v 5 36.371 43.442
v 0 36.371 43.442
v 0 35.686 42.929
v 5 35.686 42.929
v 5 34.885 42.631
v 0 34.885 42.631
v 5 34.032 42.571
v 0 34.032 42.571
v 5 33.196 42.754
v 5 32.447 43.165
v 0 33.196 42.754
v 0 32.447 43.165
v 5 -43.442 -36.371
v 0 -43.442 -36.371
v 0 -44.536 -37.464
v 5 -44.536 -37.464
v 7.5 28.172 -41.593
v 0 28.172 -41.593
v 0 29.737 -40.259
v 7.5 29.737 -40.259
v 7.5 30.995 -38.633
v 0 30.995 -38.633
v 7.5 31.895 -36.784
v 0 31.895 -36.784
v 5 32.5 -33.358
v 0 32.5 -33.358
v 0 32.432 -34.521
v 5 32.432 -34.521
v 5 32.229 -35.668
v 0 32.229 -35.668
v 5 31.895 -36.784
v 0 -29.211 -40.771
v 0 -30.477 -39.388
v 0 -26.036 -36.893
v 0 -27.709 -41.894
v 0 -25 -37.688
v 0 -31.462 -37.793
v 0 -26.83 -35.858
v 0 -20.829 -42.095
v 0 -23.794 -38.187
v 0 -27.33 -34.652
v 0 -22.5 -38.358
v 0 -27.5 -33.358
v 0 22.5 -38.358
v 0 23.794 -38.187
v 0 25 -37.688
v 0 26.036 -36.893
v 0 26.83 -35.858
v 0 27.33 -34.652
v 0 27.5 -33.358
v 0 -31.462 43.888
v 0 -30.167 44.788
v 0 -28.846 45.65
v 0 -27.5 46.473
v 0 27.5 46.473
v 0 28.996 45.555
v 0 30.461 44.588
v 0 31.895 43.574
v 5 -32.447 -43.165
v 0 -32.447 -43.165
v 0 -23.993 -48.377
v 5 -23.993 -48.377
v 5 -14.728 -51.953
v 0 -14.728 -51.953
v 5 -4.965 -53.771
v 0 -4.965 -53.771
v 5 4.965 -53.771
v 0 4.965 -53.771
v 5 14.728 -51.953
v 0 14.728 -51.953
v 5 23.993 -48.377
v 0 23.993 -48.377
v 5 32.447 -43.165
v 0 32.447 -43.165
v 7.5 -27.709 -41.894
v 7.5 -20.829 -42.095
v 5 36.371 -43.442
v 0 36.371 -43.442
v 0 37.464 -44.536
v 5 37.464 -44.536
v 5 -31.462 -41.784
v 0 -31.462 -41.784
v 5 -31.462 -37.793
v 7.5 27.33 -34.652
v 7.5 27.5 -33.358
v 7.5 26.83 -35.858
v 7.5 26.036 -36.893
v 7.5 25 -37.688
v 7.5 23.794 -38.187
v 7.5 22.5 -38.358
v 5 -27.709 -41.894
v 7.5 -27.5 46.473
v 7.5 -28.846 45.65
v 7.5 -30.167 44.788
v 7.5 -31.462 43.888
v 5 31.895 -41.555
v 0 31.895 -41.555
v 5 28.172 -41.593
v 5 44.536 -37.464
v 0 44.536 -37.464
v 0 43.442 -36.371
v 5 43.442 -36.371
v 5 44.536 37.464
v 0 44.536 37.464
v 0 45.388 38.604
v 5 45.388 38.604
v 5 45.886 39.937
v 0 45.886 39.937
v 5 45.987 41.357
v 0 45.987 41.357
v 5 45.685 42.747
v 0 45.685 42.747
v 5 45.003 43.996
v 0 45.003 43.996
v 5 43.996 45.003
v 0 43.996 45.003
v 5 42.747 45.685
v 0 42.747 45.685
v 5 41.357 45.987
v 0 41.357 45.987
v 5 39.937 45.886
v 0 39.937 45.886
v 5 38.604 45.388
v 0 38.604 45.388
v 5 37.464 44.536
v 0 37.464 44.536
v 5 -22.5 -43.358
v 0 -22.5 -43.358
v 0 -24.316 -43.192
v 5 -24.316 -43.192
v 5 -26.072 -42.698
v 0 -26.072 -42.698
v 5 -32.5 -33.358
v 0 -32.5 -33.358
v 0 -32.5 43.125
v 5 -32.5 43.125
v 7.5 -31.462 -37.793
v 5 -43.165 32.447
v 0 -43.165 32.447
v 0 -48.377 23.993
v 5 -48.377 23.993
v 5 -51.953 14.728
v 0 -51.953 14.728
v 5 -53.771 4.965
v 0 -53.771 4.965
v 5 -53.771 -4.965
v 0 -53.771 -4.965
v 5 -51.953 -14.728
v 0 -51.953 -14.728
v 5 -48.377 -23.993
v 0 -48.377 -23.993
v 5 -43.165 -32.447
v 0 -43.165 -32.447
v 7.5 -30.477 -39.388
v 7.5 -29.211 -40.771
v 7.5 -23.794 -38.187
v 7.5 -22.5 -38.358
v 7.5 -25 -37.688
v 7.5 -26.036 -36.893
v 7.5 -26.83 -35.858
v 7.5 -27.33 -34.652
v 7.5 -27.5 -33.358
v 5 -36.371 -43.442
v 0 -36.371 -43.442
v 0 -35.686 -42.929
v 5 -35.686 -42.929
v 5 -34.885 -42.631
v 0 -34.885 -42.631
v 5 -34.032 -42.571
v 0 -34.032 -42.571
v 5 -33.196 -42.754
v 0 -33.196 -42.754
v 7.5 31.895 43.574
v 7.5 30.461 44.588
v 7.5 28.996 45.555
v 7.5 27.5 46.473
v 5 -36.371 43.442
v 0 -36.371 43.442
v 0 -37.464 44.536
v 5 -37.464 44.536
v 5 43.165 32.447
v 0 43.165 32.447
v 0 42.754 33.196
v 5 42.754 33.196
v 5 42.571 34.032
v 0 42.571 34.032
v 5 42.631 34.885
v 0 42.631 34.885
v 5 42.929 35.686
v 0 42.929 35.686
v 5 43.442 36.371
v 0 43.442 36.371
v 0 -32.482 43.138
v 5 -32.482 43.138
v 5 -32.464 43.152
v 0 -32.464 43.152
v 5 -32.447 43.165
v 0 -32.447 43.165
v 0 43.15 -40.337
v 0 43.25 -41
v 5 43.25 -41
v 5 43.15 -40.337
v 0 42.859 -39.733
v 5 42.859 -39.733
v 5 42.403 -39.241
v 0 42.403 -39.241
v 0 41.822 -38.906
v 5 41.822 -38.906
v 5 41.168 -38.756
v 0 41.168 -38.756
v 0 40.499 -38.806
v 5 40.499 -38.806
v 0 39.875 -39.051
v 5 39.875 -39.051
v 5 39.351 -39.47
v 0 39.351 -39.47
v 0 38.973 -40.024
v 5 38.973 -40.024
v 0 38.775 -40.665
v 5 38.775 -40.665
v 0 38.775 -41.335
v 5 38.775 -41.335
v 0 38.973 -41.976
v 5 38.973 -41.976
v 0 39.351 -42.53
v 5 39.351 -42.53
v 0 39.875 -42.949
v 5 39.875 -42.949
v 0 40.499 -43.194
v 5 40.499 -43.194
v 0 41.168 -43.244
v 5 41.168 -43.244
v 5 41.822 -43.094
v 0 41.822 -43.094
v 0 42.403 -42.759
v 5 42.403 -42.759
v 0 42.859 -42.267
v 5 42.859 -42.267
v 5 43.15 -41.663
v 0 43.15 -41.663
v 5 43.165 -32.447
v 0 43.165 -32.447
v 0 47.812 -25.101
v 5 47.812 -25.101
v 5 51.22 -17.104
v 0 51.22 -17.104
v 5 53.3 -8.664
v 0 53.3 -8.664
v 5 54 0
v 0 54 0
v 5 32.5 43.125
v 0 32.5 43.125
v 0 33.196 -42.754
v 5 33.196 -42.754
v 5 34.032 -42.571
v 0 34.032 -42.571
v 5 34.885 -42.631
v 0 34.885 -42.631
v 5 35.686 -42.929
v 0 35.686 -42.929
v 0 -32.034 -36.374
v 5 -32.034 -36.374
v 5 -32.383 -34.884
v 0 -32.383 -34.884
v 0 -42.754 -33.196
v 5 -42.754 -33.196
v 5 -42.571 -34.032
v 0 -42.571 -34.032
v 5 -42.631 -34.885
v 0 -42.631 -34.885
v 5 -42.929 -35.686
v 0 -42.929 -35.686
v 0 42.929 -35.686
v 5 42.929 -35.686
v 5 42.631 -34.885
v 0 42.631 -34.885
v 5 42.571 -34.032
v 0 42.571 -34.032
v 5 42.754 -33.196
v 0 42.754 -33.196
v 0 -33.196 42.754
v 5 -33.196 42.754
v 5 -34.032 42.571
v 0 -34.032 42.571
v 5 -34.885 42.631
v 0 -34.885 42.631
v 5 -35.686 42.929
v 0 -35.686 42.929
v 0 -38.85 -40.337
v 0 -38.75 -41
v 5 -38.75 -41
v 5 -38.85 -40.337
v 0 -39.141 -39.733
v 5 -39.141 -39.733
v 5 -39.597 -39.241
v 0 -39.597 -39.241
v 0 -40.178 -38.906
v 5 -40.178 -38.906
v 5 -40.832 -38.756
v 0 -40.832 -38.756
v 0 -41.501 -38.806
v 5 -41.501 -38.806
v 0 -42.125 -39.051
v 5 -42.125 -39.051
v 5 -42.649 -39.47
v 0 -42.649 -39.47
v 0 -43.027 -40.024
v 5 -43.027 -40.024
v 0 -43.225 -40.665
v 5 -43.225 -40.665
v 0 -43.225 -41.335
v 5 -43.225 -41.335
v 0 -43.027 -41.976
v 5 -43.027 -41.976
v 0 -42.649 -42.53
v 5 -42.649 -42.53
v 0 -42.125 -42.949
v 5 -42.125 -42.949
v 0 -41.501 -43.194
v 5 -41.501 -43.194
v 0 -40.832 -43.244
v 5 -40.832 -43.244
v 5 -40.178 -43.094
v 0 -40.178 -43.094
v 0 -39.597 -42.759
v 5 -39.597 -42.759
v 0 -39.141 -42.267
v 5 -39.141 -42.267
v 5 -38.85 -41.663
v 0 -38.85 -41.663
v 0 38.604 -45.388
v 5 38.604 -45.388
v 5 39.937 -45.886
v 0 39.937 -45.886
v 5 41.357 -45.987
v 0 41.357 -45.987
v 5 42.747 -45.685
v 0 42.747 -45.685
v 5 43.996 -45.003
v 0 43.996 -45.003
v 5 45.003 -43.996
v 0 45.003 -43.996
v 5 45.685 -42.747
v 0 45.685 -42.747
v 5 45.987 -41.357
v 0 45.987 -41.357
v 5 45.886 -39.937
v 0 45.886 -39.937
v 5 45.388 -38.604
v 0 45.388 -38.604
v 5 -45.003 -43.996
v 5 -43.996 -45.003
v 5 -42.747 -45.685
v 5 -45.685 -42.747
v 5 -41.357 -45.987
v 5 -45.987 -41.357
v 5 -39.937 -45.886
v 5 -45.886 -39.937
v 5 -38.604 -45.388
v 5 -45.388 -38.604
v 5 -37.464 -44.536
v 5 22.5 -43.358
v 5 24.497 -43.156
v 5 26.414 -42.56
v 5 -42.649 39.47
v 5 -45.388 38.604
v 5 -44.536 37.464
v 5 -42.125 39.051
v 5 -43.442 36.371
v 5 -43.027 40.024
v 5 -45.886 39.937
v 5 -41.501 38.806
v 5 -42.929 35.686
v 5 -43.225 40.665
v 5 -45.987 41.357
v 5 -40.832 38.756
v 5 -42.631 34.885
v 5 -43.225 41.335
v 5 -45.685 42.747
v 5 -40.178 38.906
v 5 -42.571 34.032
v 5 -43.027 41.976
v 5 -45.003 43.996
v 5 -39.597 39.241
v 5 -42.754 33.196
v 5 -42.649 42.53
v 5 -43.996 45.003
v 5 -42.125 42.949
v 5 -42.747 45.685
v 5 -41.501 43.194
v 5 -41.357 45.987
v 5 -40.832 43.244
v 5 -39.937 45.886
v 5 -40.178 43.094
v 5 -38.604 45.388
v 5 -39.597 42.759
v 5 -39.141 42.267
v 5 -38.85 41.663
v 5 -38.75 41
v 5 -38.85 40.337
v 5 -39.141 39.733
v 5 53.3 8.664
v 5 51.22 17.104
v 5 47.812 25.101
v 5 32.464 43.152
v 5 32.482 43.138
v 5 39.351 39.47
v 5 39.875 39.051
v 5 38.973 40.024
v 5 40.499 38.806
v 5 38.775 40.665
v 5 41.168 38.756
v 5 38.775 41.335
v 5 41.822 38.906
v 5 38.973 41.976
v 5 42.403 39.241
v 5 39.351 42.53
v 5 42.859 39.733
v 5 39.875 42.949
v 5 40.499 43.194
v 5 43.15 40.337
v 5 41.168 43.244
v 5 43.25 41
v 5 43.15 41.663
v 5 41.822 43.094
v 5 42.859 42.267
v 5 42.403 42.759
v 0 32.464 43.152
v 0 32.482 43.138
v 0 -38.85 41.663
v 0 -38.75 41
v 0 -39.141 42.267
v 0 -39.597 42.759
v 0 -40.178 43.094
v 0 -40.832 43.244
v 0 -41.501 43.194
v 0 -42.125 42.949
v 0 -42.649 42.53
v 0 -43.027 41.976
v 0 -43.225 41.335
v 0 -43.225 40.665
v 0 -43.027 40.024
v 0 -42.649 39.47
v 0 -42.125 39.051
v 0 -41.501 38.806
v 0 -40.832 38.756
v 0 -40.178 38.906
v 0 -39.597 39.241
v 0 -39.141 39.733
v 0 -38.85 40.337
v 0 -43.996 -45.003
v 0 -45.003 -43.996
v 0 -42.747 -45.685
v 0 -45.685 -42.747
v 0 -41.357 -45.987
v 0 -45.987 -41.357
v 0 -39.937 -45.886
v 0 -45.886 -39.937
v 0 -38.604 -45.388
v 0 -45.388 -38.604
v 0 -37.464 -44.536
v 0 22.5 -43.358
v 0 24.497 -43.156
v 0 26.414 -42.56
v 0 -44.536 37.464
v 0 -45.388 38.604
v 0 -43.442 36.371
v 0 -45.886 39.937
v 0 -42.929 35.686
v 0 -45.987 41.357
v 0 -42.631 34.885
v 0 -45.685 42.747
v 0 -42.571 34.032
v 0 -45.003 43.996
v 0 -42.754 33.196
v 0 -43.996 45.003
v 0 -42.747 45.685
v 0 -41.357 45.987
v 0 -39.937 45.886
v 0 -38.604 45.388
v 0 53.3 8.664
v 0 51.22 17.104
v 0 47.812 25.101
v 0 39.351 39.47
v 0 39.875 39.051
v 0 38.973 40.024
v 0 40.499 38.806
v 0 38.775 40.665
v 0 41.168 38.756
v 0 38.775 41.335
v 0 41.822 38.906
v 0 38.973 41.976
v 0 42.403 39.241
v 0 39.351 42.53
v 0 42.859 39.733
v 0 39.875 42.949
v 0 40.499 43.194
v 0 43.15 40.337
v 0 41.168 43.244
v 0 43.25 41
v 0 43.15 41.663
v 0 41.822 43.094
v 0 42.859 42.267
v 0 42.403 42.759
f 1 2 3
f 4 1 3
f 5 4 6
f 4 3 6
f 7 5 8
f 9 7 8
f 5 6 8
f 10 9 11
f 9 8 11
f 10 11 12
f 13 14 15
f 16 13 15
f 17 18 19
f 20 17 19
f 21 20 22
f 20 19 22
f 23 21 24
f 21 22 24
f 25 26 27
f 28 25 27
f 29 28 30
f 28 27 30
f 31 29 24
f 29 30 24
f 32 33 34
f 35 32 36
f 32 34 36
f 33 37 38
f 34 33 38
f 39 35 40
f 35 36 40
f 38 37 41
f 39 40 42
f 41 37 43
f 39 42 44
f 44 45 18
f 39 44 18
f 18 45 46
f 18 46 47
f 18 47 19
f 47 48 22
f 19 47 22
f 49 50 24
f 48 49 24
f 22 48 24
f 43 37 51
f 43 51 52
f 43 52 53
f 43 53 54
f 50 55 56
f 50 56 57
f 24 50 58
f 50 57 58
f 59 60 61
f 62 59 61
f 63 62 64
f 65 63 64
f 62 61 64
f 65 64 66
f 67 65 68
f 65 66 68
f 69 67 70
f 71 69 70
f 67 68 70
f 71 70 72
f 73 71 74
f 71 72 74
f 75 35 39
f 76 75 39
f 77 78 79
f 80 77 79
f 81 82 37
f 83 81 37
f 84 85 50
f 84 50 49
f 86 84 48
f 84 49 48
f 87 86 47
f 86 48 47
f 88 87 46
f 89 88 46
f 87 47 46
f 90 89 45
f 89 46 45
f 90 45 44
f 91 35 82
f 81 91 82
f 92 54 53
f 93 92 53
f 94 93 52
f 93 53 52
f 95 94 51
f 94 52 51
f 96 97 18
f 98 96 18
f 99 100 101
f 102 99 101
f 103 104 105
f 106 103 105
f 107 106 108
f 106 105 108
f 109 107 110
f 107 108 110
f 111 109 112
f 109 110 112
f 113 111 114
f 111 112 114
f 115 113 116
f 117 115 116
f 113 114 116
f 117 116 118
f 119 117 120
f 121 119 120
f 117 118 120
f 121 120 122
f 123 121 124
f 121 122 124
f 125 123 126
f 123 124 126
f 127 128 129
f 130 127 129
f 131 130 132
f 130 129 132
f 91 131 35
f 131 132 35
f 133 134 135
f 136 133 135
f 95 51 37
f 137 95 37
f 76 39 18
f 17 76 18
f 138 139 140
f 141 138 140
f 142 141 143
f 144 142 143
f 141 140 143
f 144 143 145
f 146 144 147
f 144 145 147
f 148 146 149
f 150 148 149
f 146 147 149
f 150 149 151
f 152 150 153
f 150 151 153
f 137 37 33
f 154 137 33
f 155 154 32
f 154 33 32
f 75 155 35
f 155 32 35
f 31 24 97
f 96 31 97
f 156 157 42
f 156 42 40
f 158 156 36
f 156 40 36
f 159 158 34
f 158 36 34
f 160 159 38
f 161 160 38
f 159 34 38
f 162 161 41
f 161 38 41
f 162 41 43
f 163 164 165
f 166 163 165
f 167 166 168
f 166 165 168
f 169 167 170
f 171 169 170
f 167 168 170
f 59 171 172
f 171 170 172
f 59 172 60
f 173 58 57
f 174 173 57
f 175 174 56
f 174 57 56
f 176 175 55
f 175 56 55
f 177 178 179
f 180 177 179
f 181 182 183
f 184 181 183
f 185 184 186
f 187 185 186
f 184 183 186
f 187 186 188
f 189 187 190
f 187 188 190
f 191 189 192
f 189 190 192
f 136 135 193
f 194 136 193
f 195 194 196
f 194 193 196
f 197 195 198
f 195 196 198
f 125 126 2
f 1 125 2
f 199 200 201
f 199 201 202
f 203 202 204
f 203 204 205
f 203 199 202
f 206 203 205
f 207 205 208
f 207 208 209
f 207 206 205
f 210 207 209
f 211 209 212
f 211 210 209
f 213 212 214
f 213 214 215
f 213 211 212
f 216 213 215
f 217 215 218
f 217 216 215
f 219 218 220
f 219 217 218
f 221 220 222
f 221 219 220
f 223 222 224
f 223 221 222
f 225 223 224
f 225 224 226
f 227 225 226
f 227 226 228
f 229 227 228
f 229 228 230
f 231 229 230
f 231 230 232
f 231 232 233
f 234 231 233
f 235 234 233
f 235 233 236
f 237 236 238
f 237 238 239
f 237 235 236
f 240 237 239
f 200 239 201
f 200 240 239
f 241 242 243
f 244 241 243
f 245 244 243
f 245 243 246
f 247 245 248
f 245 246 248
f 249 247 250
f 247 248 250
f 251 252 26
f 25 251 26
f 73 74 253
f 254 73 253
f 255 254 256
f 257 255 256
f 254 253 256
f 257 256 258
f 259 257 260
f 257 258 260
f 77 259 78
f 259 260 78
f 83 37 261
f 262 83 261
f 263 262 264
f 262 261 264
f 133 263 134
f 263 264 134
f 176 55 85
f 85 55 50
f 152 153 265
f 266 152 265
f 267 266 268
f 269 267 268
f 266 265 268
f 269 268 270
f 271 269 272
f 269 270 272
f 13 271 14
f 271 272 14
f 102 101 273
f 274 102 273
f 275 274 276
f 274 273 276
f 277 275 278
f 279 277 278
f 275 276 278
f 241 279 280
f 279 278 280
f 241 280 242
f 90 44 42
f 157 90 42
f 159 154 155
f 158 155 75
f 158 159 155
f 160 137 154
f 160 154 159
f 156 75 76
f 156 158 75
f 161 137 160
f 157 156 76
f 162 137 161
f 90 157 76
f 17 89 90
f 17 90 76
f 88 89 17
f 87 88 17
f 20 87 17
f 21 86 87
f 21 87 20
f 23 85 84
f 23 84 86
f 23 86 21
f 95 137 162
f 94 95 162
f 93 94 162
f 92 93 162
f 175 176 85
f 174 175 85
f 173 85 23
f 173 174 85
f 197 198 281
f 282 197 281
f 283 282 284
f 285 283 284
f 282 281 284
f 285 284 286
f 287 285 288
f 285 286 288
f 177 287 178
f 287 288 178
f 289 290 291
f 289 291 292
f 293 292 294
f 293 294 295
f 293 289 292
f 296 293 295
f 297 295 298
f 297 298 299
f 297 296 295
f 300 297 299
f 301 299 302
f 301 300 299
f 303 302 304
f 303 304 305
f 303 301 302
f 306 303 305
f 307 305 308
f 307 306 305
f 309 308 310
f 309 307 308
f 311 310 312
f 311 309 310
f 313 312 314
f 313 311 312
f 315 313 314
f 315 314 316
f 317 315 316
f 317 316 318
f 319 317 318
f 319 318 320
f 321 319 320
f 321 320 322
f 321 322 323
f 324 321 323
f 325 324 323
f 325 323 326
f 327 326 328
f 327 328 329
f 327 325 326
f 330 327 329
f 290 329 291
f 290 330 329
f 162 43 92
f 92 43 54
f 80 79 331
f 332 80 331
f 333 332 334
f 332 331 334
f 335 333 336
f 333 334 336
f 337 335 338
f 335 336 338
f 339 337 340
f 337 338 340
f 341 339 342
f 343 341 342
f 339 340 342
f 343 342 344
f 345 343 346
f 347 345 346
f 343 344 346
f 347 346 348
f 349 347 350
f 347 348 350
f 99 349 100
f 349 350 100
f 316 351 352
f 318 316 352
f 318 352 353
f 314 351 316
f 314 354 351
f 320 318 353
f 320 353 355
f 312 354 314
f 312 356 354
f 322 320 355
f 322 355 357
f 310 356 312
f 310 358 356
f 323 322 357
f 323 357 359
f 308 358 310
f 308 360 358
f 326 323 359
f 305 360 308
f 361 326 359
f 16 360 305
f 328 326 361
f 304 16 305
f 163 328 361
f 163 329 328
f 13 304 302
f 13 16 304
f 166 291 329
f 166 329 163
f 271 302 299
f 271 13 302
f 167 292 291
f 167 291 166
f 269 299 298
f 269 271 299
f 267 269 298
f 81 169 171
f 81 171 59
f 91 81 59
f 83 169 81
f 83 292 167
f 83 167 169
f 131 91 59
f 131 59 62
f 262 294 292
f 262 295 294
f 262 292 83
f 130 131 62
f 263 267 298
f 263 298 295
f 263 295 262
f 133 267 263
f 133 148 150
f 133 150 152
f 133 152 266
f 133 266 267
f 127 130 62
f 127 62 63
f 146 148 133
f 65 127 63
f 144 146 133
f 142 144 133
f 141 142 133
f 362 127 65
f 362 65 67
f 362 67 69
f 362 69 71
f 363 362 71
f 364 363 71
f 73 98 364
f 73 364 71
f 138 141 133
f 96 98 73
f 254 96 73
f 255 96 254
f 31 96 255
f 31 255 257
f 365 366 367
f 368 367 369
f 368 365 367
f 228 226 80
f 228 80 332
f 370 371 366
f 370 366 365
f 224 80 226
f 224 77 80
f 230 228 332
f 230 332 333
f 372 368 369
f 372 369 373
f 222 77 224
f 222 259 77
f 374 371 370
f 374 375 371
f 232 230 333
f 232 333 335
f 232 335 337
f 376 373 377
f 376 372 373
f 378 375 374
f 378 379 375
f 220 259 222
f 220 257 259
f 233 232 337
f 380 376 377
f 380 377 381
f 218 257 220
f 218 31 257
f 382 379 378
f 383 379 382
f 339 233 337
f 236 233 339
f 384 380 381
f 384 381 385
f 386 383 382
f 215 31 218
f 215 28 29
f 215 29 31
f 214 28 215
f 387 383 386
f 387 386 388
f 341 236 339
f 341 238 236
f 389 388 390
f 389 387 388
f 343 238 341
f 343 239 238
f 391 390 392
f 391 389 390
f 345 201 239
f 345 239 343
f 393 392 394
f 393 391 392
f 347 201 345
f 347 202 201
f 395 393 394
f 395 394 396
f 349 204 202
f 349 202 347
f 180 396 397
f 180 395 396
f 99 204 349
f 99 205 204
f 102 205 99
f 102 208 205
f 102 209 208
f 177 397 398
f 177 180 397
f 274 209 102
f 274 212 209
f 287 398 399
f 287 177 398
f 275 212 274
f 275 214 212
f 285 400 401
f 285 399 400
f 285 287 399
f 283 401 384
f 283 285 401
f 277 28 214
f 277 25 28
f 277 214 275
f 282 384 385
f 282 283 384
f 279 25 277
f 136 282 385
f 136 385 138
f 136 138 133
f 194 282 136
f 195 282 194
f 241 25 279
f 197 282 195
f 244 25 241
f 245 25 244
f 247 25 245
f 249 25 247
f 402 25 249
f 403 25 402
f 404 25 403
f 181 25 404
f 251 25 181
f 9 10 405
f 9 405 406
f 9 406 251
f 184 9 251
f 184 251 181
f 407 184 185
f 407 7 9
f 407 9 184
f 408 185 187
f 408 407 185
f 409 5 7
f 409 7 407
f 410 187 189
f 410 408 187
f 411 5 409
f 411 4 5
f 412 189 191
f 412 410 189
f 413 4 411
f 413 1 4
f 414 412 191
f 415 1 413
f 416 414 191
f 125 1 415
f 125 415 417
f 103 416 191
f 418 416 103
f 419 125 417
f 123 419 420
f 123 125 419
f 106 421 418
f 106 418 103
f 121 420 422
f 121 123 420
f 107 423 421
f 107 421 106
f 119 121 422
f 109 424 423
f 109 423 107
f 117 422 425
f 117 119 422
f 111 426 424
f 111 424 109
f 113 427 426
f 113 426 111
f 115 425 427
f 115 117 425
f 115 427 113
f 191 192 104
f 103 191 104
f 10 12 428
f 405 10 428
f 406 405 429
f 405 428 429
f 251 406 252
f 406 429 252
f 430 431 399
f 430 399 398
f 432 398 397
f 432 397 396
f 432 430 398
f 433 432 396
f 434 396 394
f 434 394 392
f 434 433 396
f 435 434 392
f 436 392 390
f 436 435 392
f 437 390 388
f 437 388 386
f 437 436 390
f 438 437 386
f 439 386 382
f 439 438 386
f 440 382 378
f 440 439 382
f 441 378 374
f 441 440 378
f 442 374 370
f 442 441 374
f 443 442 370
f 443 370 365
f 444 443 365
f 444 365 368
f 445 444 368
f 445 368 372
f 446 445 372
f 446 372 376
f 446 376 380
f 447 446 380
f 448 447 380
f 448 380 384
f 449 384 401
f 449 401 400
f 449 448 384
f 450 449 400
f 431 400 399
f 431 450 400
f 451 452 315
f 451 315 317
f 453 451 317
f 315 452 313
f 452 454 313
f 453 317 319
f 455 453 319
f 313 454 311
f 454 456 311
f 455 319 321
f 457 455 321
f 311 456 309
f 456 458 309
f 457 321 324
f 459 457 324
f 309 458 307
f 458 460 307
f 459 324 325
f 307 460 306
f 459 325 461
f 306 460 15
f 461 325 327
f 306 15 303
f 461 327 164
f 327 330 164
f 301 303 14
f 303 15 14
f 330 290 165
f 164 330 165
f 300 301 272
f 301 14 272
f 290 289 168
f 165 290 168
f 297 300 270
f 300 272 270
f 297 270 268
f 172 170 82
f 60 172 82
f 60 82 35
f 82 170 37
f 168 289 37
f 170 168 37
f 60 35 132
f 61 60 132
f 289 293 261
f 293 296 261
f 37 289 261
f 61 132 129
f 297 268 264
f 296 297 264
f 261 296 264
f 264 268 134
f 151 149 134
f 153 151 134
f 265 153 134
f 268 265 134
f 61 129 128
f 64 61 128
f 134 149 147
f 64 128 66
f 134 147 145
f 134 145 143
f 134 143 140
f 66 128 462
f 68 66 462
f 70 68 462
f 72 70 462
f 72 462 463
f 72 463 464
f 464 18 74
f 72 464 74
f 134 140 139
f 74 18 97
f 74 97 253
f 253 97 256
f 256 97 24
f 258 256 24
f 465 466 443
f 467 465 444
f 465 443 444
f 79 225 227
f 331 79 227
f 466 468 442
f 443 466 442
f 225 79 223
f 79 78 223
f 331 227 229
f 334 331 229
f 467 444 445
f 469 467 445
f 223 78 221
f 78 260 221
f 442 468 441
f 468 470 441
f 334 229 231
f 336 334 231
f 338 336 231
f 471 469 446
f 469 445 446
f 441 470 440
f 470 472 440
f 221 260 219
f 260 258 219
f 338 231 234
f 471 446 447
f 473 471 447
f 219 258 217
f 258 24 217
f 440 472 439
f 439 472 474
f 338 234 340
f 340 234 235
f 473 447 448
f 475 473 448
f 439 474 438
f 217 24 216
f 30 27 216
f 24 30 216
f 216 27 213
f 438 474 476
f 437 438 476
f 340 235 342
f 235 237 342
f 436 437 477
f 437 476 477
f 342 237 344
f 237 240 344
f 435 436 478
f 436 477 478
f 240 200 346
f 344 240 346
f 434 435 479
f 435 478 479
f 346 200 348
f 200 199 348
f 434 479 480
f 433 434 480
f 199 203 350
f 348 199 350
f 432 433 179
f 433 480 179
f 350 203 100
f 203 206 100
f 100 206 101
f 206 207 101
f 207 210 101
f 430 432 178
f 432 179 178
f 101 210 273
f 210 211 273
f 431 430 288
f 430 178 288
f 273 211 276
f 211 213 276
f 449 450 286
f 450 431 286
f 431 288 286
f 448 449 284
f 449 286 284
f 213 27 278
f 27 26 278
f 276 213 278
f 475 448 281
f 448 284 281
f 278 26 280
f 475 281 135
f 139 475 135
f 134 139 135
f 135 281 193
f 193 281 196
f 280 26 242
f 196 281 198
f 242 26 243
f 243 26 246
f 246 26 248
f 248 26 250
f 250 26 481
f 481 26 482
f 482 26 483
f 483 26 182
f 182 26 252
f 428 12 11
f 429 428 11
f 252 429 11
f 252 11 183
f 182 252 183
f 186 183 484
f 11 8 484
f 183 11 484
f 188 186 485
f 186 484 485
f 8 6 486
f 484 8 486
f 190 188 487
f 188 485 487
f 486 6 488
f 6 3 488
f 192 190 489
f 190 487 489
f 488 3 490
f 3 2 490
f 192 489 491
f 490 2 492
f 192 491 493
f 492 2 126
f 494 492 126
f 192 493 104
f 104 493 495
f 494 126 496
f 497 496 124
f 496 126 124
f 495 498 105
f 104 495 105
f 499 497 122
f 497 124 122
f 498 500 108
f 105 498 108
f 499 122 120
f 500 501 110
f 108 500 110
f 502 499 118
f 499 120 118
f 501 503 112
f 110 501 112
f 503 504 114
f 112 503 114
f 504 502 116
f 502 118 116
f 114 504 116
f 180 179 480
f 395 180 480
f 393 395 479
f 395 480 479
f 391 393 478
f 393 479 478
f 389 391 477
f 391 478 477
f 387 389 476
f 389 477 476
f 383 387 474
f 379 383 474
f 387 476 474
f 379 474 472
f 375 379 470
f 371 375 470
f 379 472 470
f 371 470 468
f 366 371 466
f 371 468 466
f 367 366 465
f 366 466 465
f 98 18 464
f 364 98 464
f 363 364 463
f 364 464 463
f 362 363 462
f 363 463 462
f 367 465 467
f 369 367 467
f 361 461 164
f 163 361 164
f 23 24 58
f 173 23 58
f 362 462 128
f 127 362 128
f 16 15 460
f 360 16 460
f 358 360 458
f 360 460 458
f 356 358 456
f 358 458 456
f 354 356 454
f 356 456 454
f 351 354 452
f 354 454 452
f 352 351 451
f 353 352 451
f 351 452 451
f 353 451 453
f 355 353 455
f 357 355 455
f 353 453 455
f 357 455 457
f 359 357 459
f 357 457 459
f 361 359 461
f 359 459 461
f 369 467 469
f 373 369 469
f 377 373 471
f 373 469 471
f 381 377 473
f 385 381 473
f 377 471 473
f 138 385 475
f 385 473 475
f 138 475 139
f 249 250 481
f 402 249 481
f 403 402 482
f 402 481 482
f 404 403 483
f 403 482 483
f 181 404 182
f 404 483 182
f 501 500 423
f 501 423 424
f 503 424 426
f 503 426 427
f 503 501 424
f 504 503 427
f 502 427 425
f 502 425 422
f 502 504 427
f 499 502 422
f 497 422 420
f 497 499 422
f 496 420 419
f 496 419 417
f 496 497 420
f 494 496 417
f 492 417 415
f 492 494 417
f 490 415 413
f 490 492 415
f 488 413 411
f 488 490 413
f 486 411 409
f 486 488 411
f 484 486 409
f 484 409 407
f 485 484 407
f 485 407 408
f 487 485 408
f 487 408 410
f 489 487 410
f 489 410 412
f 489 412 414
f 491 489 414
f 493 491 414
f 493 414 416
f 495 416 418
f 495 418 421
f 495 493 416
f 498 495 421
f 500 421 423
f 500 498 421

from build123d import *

# Parameters (mm, degrees)
F0_R     = 2.25
F1_DEPTH = 5
F2_DEPTH = 7.5


# Not quite as in the source:
# - a feature of the source that left no trace in its solid (it failed there, or was rolled back) is left out


with BuildPart() as f1:
    # F0 (on Right) → F1 (new body)
    with BuildSketch(Plane.YZ):
        with BuildLine():
            Line((-32.5, -33.3578620553), (-32.5, 43.1248188402))
            ThreePointArc((-32.5, 43.1248188402), (-38.2073481766, 38.1601696185), (-43.1649418054, 32.4466916485))
            ThreePointArc((-43.1649418054, 32.4466916485), (-54, 0), (-43.1649418054, -32.4466916485))
            ThreePointArc((-43.1649418054, -32.4466916485), (-38.1837661841, -38.1837661841), (-32.4466916485, -43.1649418054))
            ThreePointArc((-32.4466916485, -43.1649418054), (0, -54), (32.4466916485, -43.1649418054))
            ThreePointArc((32.4466916485, -43.1649418054), (38.1837661841, -38.1837661841), (43.1649418054, -32.4466916485))
            ThreePointArc((43.1649418054, -32.4466916485), (51.2196586161, -17.1039928453), (54, 0))
            ThreePointArc((54, 0), (51.2196586161, 17.1039928453), (43.1649418054, 32.4466916485))
            ThreePointArc((43.1649418054, 32.4466916485), (38.2073481766, 38.1601696185), (32.5, 43.1248188402))
            Line((32.5, 43.1248188402), (32.5, -33.3578620553))
            ThreePointArc((32.5, -33.3578620553), (32.3474874667, -35.0976869294), (31.8946018815, -36.7844427837))
            Line((31.8946018815, -36.7844427837), (31.8946018815, -41.5552656251))
            Line((31.8946018815, -41.5552656251), (28.1724253923, -41.593369943))
            ThreePointArc((28.1724253923, -41.593369943), (25.4702627091, -42.9065551302), (22.5, -43.3578620553))
            Line((22.5, -43.3578620553), (-22.5, -43.3578620553))
            ThreePointArc((-22.5, -43.3578620553), (-25.2056219122, -42.9848870406), (-27.70941795, -41.8937840689))
            Line((-27.70941795, -41.8937840689), (-31.4624607563, -41.7840279114))
            Line((-31.4624607563, -41.7840279114), (-31.4624607563, -37.7934338552))
            ThreePointArc((-31.4624607563, -37.7934338552), (-32.2371609713, -35.6355135252), (-32.5, -33.3578620553))
        make_face()
        with BuildLine():
            ThreePointArc((-32.5, 43.1248188402), (-32.4733520211, 43.1448885561), (-32.4466916485, 43.1649418054))
            ThreePointArc((-32.4466916485, 43.1649418054), (-34.4603348429, 42.5704269643), (-36.3706059725, 43.4416737844))
            Line((-36.3706059725, 43.4416737844), (-37.4644660941, 44.5355339059))
            ThreePointArc((-37.4644660941, 44.5355339059), (-44.5355339059, 44.5355339059), (-44.5355339059, 37.4644660941))
            Line((-44.5355339059, 37.4644660941), (-43.4416737844, 36.3706059725))
            ThreePointArc((-43.4416737844, 36.3706059725), (-42.5704269643, 34.4603348429), (-43.1649418054, 32.4466916485))
            ThreePointArc((-43.1649418054, 32.4466916485), (-38.2073481766, 38.1601696185), (-32.5, 43.1248188402))
        make_face()
        with Locations((-41, 41)):
            Circle(F0_R, mode=Mode.SUBTRACT)
        with BuildLine():
            ThreePointArc((32.5, 43.1248188402), (38.2073481766, 38.1601696185), (43.1649418054, 32.4466916485))
            ThreePointArc((43.1649418054, 32.4466916485), (42.5704269643, 34.4603348429), (43.4416737844, 36.3706059725))
            Line((43.4416737844, 36.3706059725), (44.5355339059, 37.4644660941))
            ThreePointArc((44.5355339059, 37.4644660941), (44.5355339059, 44.5355339059), (37.4644660941, 44.5355339059))
            Line((37.4644660941, 44.5355339059), (36.3706059725, 43.4416737844))
            ThreePointArc((36.3706059725, 43.4416737844), (34.4603348429, 42.5704269643), (32.4466916485, 43.1649418054))
            ThreePointArc((32.4466916485, 43.1649418054), (32.4733520211, 43.1448885561), (32.5, 43.1248188402))
        make_face()
        with Locations((41, 41)):
            Circle(F0_R, mode=Mode.SUBTRACT)
        with BuildLine():
            ThreePointArc((43.1649418054, -32.4466916485), (38.1837661841, -38.1837661841), (32.4466916485, -43.1649418054))
            ThreePointArc((32.4466916485, -43.1649418054), (34.4603348429, -42.5704269643), (36.3706059725, -43.4416737844))
            Line((36.3706059725, -43.4416737844), (37.4644660941, -44.5355339059))
            ThreePointArc((37.4644660941, -44.5355339059), (44.5355339059, -44.5355339059), (44.5355339059, -37.4644660941))
            Line((44.5355339059, -37.4644660941), (43.4416737844, -36.3706059725))
            ThreePointArc((43.4416737844, -36.3706059725), (42.5704269643, -34.4603348429), (43.1649418054, -32.4466916485))
        make_face()
        with Locations((41, -41)):
            Circle(F0_R, mode=Mode.SUBTRACT)
        with BuildLine():
            ThreePointArc((-32.4466916485, -43.1649418054), (-38.1837661841, -38.1837661841), (-43.1649418054, -32.4466916485))
            ThreePointArc((-43.1649418054, -32.4466916485), (-42.5704269643, -34.4603348429), (-43.4416737844, -36.3706059725))
            Line((-43.4416737844, -36.3706059725), (-44.5355339059, -37.4644660941))
            ThreePointArc((-44.5355339059, -37.4644660941), (-44.5355339059, -44.5355339059), (-37.4644660941, -44.5355339059))
            Line((-37.4644660941, -44.5355339059), (-36.3706059725, -43.4416737844))
            ThreePointArc((-36.3706059725, -43.4416737844), (-34.4603348429, -42.5704269643), (-32.4466916485, -43.1649418054))
        make_face()
        with Locations((-41, -41)):
            Circle(F0_R, mode=Mode.SUBTRACT)
    extrude(amount=F1_DEPTH)


with BuildPart() as f2:
    # F0 (on Right) → F2 (new body)
    with BuildSketch(Plane.YZ):
        with BuildLine():
            ThreePointArc((-27.5, 46.4731105049), (-29.5095624616, 45.2237296486), (-31.4624607563, 43.8875103322))
            Line((-31.4624607563, 43.8875103322), (-31.4624607563, -33.3578620553))
            Line((-31.4624607563, -33.3578620553), (-31.4624607563, -37.7934338552))
            ThreePointArc((-31.4624607563, -37.7934338552), (-29.876567934, -40.1096207532), (-27.70941795, -41.8937840689))
            Line((-27.70941795, -41.8937840689), (-20.8289045841, -42.0950017869))
            Line((-20.8289045841, -42.0950017869), (28.1724253923, -41.593369943))
            ThreePointArc((28.1724253923, -41.593369943), (30.407924685, -39.4787057207), (31.8946018815, -36.7844427837))
            Line((31.8946018815, -36.7844427837), (31.8946018815, -33.3578620553))
            Line((31.8946018815, -33.3578620553), (31.8946018815, 43.5744692546))
            ThreePointArc((31.8946018815, 43.5744692546), (29.7326455843, 45.0773755509), (27.5, 46.4731105049))
            Line((27.5, 46.4731105049), (27.5, -33.3578620553))
            ThreePointArc((27.5, -33.3578620553), (26.0355339059, -36.8933959612), (22.5, -38.3578620553))
            Line((22.5, -38.3578620553), (-22.5, -38.3578620553))
            ThreePointArc((-22.5, -38.3578620553), (-26.0355339059, -36.8933959612), (-27.5, -33.3578620553))
            Line((-27.5, -33.3578620553), (-27.5, 46.4731105049))
        make_face()
    extrude(amount=F2_DEPTH)


solid = Compound([f1.part, f2.part])
